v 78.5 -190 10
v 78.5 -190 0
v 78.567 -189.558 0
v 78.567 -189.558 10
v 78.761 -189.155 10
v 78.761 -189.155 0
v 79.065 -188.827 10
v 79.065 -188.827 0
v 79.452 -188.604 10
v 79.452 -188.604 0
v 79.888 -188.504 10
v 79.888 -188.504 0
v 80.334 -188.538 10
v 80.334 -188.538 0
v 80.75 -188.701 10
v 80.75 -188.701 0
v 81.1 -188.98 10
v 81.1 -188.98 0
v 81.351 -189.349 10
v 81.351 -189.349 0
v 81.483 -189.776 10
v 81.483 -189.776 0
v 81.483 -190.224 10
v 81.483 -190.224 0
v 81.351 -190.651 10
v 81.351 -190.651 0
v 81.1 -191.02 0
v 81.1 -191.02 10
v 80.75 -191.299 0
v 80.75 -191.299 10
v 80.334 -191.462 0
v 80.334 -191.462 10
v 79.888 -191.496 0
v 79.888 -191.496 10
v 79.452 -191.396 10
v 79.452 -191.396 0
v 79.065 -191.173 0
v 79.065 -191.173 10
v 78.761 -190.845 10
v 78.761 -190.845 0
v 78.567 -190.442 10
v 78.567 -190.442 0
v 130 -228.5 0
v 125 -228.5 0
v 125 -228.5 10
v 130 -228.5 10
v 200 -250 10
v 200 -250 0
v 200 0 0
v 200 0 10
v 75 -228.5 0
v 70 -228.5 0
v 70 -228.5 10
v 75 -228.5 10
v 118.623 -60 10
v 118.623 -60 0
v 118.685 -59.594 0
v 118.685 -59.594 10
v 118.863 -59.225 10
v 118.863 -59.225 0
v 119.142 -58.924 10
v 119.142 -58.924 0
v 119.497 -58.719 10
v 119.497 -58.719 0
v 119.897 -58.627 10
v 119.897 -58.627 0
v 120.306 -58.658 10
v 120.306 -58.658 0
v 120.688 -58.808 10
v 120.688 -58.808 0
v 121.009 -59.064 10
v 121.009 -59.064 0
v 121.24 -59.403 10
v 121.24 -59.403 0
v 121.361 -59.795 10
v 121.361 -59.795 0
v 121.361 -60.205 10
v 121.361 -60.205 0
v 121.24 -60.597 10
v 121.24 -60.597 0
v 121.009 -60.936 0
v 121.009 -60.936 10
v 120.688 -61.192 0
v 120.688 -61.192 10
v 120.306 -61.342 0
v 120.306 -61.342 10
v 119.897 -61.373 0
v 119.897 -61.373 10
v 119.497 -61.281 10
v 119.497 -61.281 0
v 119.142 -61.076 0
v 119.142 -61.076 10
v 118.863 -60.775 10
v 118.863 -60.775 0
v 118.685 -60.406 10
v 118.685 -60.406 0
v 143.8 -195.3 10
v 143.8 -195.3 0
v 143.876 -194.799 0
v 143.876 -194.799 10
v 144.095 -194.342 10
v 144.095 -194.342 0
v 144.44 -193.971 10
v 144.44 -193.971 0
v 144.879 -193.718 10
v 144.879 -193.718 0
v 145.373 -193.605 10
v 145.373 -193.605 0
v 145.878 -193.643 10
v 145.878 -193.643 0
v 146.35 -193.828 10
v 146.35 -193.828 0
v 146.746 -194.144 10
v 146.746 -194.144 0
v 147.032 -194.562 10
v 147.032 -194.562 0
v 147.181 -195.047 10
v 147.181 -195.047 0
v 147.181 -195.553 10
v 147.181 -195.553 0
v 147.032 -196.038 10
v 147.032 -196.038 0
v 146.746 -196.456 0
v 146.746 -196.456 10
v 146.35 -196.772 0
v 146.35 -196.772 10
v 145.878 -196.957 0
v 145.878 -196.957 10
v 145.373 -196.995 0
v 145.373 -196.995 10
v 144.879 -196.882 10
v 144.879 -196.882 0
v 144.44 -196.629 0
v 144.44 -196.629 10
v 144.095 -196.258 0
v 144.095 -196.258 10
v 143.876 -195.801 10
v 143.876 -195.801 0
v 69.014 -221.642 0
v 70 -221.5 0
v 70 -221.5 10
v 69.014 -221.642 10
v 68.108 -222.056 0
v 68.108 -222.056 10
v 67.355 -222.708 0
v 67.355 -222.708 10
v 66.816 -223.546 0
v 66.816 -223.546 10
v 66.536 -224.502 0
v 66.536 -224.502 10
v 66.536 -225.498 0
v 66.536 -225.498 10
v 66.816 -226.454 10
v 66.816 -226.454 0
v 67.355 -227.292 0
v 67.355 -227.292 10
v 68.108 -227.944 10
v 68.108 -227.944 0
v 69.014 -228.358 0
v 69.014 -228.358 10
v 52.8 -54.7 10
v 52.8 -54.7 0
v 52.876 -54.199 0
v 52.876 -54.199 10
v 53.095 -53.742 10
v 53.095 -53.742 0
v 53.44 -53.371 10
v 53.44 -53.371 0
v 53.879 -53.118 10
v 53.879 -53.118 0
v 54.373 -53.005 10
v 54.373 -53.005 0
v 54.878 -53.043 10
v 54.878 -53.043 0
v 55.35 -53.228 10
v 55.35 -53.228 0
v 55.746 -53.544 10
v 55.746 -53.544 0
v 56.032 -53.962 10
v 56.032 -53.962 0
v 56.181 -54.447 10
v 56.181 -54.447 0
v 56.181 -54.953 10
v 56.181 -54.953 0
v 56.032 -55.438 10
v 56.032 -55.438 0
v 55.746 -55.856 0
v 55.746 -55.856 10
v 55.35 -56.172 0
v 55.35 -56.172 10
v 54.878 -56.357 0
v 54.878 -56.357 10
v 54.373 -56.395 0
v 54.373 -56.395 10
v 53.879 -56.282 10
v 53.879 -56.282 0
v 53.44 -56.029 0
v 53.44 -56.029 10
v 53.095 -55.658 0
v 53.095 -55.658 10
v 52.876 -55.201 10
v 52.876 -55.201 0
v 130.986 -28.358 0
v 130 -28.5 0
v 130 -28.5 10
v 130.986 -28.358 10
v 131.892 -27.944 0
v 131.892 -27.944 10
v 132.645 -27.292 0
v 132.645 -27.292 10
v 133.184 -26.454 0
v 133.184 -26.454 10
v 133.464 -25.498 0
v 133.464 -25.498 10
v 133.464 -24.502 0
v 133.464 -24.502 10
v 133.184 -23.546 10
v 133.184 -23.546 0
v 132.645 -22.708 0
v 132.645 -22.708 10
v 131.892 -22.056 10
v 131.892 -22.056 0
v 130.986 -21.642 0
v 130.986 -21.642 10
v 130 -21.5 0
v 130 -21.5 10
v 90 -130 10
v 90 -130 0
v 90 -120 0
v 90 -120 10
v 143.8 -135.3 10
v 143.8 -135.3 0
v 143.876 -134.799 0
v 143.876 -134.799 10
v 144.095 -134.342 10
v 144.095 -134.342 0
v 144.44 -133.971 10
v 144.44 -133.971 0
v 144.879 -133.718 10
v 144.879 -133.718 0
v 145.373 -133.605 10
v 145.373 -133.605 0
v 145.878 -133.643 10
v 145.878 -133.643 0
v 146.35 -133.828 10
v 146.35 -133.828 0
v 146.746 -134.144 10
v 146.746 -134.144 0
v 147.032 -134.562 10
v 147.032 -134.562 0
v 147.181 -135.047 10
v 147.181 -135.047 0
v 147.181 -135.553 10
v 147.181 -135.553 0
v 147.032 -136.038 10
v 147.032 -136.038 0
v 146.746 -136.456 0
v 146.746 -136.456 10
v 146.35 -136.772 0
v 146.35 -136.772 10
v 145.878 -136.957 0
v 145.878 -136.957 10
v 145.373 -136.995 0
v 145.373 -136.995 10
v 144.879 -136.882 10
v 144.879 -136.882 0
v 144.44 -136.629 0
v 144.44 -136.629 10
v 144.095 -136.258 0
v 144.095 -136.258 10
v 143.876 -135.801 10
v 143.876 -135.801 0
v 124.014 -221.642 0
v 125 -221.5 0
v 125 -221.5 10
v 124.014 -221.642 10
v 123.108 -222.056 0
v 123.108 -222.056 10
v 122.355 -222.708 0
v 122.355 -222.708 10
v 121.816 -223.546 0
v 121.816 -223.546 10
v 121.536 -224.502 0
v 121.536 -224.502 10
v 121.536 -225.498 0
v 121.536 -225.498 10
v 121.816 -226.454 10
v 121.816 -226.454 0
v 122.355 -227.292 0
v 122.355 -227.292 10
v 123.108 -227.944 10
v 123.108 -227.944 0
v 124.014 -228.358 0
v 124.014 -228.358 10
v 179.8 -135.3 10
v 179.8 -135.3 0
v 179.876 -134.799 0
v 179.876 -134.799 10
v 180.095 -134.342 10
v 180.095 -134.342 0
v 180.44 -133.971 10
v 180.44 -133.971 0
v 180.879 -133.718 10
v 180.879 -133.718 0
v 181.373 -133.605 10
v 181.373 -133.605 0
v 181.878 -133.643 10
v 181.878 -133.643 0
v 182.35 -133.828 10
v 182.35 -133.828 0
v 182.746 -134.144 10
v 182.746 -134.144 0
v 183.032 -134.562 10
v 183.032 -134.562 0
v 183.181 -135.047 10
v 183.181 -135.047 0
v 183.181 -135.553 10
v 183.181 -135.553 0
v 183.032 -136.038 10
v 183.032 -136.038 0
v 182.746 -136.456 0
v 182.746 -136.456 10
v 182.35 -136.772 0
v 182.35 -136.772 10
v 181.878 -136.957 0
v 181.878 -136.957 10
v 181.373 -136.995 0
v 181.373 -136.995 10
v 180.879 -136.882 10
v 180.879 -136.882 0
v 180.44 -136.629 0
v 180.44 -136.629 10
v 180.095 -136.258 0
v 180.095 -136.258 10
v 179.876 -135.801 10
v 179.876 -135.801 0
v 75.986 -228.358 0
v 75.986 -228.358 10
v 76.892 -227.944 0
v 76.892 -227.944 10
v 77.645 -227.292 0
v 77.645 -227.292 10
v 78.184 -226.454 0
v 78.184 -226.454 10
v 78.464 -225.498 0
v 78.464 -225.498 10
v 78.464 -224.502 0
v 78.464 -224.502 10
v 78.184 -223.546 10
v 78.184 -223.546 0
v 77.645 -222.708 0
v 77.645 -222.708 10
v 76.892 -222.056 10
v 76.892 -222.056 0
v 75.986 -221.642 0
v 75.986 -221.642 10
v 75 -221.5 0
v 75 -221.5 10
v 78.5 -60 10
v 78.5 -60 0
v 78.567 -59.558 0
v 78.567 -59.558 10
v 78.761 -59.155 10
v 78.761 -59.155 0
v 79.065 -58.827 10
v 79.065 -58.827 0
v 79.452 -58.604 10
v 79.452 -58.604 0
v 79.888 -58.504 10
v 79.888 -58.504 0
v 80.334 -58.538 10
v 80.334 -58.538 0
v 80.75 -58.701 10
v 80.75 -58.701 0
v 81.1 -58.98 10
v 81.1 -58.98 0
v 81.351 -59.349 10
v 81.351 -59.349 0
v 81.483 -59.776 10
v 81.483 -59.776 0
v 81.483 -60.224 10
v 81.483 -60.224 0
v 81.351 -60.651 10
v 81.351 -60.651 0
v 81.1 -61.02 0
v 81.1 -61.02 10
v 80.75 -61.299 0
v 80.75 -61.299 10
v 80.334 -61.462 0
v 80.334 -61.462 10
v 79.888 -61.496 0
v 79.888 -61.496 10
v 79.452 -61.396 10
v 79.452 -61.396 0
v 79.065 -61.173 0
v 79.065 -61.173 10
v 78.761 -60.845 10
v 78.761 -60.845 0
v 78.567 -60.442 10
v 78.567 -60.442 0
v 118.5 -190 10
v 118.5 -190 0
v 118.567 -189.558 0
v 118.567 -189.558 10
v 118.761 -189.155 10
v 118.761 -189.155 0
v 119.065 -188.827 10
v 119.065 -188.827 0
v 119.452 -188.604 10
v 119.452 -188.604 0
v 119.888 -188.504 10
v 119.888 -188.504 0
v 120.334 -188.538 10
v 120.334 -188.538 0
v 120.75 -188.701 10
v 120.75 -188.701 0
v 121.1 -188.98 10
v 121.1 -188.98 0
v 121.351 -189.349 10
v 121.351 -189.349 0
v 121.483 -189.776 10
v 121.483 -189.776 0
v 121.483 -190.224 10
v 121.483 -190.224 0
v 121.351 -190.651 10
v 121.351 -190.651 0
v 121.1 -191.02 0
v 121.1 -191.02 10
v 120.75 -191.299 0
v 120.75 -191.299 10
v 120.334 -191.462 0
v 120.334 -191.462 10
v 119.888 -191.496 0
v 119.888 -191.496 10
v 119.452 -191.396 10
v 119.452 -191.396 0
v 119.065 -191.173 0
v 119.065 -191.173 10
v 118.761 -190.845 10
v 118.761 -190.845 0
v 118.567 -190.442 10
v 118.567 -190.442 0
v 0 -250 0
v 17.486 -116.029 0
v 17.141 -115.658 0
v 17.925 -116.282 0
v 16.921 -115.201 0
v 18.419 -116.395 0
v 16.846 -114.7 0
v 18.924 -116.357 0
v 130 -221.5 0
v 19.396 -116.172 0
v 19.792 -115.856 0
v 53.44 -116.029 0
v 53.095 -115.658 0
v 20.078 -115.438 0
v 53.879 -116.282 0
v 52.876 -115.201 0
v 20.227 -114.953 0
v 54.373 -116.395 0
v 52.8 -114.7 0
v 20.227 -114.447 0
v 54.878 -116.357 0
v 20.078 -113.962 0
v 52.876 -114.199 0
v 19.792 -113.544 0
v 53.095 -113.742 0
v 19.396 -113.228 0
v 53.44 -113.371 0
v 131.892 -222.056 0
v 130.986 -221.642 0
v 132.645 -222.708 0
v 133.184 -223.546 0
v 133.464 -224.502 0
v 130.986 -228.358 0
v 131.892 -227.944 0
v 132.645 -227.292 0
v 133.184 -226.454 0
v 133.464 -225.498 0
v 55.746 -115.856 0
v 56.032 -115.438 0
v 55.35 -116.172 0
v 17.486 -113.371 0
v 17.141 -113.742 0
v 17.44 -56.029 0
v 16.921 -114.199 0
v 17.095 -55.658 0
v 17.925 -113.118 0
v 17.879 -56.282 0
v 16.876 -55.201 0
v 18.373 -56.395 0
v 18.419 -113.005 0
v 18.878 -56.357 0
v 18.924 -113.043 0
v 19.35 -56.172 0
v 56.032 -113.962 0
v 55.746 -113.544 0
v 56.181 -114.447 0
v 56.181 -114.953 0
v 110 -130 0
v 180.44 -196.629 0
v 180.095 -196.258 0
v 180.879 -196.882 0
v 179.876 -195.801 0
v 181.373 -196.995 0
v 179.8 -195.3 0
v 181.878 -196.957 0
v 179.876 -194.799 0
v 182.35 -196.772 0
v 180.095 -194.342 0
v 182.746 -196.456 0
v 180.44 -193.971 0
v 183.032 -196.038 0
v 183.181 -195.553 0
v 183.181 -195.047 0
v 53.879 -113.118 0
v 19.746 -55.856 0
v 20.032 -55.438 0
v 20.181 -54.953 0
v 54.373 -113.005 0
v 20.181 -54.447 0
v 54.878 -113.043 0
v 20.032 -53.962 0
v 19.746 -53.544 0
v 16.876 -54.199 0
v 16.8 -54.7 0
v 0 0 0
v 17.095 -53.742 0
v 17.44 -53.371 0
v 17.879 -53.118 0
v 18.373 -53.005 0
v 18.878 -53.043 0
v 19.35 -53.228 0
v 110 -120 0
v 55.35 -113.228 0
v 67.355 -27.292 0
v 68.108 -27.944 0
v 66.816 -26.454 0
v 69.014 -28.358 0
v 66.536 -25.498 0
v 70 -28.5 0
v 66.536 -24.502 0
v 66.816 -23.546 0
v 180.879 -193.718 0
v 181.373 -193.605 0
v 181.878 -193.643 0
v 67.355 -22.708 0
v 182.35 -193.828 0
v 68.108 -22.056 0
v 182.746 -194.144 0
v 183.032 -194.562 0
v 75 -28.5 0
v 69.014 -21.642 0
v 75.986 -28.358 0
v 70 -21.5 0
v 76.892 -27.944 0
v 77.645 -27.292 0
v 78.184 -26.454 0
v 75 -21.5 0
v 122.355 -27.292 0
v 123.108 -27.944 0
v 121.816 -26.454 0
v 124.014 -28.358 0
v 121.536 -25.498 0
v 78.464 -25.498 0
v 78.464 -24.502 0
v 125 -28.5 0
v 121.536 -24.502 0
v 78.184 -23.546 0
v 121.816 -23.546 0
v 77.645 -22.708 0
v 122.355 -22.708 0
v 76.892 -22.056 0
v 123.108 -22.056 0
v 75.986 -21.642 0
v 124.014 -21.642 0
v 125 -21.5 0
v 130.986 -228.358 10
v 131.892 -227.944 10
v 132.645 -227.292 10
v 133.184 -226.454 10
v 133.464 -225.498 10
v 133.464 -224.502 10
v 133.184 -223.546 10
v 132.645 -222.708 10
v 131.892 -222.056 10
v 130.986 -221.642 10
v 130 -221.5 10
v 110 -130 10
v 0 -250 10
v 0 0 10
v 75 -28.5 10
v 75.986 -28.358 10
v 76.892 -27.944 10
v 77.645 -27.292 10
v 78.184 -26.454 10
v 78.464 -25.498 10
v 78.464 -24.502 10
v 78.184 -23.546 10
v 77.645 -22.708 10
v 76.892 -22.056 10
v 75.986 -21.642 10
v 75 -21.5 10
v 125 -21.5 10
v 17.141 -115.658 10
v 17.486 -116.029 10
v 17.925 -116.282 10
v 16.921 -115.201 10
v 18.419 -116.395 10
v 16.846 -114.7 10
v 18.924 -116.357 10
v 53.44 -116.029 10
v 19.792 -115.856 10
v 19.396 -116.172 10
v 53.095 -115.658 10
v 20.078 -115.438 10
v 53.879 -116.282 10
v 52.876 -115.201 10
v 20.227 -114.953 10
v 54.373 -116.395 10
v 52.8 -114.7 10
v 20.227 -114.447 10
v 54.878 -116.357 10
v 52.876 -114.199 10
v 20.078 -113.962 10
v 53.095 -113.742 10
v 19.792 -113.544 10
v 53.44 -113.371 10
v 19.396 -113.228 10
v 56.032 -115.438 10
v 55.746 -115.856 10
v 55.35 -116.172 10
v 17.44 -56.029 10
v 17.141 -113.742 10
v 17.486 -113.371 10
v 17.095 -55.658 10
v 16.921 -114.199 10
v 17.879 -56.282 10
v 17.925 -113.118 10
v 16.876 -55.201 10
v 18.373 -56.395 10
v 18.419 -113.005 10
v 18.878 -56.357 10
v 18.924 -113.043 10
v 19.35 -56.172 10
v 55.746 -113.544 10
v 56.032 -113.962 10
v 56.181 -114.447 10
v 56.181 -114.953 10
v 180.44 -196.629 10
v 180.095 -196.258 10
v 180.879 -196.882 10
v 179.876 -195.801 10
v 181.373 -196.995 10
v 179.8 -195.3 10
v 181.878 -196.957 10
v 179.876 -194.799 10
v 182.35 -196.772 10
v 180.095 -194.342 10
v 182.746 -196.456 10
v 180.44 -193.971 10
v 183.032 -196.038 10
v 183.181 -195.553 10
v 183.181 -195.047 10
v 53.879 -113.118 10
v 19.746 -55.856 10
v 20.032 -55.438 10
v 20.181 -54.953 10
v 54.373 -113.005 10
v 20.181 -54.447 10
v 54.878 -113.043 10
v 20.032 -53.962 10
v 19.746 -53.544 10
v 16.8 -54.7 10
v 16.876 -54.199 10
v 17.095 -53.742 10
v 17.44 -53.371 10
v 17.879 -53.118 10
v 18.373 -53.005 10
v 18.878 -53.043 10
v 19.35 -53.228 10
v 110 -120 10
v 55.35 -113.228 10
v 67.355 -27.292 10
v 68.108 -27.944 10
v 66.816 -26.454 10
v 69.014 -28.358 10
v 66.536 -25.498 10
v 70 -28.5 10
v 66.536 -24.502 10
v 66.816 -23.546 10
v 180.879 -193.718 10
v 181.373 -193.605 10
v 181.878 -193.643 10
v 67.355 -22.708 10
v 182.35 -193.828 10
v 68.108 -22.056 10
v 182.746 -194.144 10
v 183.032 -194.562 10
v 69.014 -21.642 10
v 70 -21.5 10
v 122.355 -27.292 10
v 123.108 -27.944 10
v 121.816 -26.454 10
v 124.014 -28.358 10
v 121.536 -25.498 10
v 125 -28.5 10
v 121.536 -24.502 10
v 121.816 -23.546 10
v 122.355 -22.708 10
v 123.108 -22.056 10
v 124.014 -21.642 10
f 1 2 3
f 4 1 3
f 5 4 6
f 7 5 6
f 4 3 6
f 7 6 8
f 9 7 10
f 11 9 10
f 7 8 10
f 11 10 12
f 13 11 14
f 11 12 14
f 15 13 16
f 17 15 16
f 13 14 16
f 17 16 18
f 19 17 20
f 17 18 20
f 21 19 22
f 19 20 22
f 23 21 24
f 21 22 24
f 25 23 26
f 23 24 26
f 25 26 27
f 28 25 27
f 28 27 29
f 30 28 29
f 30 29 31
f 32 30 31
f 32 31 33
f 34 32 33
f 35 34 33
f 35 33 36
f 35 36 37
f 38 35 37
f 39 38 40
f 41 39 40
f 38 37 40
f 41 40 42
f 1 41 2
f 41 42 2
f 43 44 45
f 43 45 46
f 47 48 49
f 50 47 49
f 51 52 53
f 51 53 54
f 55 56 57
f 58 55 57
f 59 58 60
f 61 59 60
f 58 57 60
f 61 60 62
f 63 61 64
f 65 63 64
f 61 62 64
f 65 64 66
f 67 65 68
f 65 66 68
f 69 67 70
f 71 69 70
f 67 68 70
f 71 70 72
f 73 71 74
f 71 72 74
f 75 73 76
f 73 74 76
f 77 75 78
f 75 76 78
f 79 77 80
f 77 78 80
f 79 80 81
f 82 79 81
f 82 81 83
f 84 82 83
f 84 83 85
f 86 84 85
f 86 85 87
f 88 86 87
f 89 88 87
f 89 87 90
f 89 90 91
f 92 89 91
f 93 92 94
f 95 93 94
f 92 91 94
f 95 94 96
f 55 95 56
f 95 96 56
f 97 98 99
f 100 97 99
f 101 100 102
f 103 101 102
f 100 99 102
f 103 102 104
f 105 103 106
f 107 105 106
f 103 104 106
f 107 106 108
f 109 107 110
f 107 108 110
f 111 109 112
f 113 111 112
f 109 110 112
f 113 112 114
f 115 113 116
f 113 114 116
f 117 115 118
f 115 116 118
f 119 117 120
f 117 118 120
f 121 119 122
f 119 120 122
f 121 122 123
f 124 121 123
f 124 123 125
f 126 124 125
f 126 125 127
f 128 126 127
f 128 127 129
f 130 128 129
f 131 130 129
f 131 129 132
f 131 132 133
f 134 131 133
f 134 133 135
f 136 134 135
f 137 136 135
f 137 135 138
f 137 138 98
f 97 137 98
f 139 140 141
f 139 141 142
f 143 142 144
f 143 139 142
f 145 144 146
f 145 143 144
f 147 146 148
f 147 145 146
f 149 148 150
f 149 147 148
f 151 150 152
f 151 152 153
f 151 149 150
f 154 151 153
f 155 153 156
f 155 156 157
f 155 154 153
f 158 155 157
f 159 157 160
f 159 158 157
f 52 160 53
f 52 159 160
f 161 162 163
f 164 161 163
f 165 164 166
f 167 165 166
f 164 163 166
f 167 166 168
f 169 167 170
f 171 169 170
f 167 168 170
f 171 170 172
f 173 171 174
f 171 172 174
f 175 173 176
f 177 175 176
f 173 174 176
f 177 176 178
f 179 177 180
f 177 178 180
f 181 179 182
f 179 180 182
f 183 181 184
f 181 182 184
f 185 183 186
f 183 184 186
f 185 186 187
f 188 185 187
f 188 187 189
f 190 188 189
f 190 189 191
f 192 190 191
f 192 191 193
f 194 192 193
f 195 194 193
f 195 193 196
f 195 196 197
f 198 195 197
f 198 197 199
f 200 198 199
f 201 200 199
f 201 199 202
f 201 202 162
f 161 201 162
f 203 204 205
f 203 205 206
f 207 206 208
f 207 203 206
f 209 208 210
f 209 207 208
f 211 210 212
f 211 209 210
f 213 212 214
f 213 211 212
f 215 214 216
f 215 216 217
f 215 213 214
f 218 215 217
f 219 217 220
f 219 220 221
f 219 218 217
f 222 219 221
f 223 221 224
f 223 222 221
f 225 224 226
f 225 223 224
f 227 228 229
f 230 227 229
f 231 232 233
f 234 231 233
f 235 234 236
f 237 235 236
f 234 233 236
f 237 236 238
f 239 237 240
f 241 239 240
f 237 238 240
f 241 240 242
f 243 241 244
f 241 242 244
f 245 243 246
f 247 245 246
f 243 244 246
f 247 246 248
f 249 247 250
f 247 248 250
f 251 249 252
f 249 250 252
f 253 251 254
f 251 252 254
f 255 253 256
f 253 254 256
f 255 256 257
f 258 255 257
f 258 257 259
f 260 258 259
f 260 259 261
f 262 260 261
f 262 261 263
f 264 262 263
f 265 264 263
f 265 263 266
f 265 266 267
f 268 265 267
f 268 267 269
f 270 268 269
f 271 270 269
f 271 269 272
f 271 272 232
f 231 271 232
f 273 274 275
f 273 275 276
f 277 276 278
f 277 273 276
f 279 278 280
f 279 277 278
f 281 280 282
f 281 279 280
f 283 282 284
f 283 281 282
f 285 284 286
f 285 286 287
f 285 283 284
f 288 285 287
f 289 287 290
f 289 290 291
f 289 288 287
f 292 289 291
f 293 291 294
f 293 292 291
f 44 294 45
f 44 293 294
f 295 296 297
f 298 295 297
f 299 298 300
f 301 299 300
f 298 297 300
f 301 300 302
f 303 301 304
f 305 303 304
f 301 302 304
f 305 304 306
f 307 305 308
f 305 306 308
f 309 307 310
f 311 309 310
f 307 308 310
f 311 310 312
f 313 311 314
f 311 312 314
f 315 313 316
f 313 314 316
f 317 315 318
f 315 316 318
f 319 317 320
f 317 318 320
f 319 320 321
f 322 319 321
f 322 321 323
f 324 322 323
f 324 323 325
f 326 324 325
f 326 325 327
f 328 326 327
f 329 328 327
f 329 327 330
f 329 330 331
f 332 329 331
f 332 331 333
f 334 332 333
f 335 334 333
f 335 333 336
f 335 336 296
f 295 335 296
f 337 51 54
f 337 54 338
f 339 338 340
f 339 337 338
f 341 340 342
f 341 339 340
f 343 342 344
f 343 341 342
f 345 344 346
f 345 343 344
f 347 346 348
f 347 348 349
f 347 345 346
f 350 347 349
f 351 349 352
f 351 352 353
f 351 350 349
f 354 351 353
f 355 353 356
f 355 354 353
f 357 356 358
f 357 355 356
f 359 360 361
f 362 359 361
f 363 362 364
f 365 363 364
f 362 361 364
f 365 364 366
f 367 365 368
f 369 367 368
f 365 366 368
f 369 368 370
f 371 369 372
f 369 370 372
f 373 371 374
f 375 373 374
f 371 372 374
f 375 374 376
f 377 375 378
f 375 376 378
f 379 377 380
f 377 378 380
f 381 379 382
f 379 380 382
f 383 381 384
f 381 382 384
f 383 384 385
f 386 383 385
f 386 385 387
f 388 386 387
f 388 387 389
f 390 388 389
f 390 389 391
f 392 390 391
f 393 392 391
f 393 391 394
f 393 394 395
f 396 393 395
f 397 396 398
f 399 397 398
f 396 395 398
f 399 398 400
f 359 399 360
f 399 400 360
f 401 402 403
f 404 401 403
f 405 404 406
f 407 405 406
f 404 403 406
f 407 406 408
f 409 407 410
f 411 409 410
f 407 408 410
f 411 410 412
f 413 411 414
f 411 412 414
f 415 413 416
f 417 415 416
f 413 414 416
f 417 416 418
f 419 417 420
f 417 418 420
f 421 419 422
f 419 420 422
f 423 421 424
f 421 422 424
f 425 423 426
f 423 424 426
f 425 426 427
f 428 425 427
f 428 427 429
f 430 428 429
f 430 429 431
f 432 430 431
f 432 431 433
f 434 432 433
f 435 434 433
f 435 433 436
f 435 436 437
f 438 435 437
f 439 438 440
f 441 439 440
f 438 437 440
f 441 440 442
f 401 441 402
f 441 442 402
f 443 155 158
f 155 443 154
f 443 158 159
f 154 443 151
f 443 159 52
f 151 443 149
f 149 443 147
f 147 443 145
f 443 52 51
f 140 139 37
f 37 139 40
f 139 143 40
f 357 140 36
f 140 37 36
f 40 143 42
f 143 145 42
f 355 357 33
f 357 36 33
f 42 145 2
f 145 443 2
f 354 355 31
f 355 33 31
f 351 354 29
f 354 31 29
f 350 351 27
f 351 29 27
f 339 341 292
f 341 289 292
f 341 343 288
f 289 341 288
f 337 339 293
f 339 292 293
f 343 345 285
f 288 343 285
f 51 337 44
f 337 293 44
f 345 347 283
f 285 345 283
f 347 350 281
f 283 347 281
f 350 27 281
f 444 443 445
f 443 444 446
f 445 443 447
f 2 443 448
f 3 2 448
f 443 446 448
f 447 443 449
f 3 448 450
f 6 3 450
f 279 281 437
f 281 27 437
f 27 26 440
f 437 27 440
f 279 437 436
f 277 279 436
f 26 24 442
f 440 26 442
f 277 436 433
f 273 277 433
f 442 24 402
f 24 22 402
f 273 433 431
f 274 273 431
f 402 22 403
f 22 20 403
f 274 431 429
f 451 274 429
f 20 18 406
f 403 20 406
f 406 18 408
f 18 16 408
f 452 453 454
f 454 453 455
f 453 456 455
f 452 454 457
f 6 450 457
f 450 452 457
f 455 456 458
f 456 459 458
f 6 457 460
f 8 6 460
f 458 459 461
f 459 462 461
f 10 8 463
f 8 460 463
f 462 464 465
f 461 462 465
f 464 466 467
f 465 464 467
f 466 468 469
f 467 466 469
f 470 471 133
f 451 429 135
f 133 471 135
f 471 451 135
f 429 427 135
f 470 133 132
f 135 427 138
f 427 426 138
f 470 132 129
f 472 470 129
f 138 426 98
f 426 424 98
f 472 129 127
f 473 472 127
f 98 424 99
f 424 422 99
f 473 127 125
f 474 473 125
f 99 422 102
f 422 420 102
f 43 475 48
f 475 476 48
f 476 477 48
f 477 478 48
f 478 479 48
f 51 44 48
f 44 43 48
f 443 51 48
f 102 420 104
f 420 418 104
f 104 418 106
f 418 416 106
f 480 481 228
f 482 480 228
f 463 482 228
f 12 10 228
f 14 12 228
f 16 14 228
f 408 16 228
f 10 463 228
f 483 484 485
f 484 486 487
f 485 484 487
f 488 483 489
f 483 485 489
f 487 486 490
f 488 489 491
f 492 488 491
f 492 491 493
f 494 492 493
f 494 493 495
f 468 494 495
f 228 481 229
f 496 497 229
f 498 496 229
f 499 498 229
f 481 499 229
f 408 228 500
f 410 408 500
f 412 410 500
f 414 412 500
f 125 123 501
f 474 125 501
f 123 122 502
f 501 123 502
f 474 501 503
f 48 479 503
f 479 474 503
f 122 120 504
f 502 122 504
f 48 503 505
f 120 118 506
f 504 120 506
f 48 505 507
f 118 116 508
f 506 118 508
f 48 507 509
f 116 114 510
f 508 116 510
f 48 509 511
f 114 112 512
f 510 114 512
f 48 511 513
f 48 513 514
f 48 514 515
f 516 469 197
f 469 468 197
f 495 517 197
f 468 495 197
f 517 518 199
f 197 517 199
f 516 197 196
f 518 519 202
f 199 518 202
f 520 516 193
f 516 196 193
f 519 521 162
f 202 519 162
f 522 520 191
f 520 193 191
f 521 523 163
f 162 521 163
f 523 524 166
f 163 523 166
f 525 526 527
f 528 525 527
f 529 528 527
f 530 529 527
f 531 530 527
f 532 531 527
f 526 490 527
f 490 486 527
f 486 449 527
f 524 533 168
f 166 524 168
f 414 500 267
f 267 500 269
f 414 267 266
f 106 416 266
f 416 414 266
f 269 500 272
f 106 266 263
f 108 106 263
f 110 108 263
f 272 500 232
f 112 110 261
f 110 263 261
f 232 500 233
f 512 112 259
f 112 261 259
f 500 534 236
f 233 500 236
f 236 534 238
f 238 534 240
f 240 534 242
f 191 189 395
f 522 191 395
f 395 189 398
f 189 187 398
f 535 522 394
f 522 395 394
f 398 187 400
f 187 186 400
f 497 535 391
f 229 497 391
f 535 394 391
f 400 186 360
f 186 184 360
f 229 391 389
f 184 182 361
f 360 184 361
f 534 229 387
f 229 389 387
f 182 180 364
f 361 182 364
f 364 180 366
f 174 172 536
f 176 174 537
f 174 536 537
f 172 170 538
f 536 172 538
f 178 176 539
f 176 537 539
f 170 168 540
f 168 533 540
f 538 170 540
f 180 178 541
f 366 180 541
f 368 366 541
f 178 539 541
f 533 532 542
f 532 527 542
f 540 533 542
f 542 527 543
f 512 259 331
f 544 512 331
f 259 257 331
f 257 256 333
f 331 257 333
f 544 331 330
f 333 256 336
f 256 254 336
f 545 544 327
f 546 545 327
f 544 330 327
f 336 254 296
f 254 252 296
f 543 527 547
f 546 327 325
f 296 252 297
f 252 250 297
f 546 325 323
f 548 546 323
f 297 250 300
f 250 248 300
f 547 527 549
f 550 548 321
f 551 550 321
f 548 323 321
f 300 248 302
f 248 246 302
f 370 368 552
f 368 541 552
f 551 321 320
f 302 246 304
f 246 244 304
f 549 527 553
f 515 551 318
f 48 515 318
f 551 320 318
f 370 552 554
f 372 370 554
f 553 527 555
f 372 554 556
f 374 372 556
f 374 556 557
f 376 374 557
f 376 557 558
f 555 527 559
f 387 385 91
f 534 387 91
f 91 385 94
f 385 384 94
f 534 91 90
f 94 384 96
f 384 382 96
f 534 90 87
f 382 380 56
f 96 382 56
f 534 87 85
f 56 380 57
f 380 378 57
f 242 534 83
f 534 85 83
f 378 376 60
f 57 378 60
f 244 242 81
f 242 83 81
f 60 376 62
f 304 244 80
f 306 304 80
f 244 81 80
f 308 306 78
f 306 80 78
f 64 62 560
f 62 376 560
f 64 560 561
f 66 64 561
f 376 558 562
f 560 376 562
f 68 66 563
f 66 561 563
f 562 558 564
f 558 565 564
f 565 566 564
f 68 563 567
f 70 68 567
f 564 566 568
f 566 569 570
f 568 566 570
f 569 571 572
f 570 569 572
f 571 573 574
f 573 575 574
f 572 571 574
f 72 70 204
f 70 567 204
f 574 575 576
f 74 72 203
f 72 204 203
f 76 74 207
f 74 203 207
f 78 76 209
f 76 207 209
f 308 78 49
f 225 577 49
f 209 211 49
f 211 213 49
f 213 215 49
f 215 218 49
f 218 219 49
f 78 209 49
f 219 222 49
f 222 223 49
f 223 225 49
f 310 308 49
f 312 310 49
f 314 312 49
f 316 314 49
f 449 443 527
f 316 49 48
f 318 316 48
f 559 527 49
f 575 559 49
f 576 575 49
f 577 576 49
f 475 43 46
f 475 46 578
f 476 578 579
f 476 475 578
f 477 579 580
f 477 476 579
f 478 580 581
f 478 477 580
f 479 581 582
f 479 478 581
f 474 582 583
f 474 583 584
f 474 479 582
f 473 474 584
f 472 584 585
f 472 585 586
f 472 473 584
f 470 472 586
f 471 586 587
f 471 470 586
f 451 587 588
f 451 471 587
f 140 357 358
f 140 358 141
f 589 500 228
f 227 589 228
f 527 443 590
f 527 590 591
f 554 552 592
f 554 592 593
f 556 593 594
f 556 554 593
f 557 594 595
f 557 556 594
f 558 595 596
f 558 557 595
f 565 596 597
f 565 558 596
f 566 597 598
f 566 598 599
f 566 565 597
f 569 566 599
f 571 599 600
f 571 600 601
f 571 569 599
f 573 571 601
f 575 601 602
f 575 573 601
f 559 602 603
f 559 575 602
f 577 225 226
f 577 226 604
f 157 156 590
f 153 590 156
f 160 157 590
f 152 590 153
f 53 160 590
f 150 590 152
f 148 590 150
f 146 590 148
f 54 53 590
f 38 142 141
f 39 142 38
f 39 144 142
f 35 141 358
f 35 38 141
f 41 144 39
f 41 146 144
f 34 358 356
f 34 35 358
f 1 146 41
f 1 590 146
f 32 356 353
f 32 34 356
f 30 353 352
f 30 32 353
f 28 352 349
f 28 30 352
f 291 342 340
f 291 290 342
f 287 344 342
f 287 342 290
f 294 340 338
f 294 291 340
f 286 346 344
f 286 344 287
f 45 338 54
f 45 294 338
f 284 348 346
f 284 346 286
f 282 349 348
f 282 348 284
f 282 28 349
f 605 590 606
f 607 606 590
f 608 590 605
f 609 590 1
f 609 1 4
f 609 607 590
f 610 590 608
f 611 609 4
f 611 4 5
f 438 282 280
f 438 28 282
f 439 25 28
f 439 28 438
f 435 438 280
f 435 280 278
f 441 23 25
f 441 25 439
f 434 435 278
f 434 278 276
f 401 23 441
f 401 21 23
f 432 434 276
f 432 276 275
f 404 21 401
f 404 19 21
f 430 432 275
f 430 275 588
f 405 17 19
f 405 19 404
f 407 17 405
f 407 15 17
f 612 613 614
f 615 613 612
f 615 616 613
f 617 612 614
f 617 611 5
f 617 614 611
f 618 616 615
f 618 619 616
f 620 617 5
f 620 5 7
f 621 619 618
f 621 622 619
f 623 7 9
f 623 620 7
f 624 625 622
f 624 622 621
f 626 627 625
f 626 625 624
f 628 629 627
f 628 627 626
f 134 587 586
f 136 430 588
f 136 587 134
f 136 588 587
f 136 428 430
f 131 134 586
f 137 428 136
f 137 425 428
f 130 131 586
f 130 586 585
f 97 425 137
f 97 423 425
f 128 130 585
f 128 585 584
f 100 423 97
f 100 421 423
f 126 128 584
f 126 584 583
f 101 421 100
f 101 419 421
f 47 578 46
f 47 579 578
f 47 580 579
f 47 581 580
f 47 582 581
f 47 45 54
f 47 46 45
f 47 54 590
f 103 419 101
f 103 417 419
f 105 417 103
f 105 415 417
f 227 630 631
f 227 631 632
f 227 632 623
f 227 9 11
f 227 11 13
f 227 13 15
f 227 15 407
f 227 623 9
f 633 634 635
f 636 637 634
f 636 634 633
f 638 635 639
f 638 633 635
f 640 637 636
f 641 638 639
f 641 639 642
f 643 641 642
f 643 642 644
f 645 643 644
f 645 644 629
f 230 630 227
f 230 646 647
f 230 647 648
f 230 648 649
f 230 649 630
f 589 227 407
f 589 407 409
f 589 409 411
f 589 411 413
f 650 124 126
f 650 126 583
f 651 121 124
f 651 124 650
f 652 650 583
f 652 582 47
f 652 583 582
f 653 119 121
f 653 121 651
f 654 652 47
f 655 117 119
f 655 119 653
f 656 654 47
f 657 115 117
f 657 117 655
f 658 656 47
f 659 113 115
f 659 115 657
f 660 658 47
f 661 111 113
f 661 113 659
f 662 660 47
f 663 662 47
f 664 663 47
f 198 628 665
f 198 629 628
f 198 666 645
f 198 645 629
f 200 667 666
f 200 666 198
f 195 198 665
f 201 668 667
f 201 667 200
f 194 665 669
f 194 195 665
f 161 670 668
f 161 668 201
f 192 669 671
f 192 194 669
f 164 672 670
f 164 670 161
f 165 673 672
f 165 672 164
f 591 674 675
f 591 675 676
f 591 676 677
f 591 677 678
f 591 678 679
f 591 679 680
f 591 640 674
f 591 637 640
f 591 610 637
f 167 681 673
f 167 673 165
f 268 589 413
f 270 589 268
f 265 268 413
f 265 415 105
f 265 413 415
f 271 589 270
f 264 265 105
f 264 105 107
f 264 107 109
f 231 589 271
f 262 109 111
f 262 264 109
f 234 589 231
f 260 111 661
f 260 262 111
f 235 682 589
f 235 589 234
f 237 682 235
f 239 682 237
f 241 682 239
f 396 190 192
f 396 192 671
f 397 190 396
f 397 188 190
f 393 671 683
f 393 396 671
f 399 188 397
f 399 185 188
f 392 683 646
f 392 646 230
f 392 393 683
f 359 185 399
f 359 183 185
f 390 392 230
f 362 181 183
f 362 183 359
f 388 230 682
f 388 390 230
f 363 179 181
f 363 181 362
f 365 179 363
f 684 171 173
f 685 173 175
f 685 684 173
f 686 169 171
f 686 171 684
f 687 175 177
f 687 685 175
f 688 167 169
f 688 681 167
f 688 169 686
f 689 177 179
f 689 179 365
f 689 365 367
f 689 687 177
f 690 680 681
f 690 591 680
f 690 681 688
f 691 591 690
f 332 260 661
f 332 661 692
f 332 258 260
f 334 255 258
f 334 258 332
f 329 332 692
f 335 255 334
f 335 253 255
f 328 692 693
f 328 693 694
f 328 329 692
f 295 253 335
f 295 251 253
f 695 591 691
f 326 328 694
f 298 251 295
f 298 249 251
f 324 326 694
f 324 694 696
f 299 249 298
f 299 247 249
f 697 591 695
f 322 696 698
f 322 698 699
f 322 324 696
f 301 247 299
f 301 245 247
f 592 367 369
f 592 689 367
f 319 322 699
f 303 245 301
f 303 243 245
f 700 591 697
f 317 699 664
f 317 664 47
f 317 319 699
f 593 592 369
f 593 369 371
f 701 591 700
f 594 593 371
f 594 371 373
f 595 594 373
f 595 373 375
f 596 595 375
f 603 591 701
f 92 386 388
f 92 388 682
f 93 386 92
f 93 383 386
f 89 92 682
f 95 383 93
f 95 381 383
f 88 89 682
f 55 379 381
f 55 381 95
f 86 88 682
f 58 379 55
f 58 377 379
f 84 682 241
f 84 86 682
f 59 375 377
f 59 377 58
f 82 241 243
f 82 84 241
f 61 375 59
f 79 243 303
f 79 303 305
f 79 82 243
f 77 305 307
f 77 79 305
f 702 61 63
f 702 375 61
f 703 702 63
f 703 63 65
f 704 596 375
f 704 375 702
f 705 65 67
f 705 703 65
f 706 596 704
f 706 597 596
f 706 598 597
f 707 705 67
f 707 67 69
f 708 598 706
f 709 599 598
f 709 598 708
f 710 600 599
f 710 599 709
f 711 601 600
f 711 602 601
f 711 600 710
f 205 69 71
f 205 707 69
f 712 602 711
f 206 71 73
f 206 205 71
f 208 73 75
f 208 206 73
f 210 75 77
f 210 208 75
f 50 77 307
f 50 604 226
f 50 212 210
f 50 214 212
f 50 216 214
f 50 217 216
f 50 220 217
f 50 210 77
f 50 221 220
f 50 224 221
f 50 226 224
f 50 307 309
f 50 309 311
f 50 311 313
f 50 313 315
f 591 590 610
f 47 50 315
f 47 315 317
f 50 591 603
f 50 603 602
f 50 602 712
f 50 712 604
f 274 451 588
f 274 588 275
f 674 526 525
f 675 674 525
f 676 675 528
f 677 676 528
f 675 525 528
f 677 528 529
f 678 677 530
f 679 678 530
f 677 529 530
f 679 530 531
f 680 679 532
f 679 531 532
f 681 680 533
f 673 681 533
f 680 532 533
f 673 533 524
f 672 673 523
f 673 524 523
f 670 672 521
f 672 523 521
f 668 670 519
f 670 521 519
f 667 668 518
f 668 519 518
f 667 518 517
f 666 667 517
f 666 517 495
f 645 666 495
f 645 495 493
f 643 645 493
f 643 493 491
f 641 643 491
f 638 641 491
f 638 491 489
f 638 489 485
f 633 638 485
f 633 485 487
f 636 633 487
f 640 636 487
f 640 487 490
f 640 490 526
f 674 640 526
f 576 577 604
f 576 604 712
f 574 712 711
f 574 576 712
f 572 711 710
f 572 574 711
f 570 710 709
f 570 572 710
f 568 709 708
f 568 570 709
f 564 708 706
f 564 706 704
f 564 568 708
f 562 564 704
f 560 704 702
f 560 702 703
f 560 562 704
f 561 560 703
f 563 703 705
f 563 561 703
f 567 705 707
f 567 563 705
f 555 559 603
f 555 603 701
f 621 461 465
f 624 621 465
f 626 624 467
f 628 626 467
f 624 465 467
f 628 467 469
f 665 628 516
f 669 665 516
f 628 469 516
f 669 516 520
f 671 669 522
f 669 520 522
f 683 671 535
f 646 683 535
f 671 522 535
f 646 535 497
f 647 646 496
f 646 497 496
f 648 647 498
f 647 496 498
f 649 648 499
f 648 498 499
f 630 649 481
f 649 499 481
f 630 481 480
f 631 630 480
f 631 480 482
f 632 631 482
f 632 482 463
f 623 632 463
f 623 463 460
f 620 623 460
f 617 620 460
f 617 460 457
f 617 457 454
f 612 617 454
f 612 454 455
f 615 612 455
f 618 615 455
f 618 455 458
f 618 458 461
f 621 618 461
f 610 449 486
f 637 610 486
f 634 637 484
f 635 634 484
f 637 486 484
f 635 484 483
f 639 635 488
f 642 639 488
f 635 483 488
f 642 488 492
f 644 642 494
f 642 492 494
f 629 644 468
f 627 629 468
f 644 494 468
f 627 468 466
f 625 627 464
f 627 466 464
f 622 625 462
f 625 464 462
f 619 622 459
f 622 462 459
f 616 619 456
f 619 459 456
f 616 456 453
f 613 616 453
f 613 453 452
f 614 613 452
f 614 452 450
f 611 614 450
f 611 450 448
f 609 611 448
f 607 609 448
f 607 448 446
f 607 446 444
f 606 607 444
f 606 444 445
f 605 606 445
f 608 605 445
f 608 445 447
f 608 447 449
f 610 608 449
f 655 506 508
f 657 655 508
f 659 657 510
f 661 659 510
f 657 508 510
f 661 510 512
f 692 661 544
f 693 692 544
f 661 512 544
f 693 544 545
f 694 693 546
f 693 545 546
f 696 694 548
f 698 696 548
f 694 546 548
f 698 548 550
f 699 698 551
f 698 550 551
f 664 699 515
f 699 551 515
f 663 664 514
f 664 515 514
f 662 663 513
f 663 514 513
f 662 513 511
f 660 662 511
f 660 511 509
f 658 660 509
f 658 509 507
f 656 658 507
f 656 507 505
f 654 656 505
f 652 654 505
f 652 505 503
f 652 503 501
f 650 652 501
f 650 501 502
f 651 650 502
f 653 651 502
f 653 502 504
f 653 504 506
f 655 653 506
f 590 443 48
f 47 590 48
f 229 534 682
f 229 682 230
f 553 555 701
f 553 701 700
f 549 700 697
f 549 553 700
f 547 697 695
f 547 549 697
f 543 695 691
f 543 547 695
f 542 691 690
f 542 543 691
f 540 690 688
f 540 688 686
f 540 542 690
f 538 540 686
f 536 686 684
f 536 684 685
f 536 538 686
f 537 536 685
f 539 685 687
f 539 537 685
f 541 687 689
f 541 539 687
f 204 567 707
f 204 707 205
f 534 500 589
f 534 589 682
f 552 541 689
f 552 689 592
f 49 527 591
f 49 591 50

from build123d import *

# Parameters (mm, degrees)
ESQUISSE2_W             = 200
ESQUISSE2_H             = 250
BOSS_EXTRU_1_DEPTH      = 10
ESQUISSE7_W             = 20
ESQUISSE7_H             = 10
ENL_V_MAT_EXTRU_2_DEPTH = 10
ENL_V_MAT_EXTRU_3_DEPTH = 10
ESQUISSE11_R            = 1.5
ESQUISSE11_R_2          = 1.37656202
ENL_V_MAT_EXTRU_4_DEPTH = 10
D_GAGEMENT_M31_D        = 3.4


with BuildPart() as part:
    # Esquisse2 → Boss.-Extru.1 (new body)
    with BuildSketch(Plane.XY):
        with Locations((100, -125)):
            Rectangle(ESQUISSE2_W, ESQUISSE2_H)
    extrude(amount=BOSS_EXTRU_1_DEPTH)

    # Esquisse7 → Enlèv. mat.-Extru.2 (cut)
    with BuildSketch(Plane(origin=(0, 0, 0), x_dir=(-1, 0, 0), z_dir=(0, 0, -1))):
        with Locations((-100, -125)):
            Rectangle(ESQUISSE7_W, ESQUISSE7_H)
    extrude(amount=-ENL_V_MAT_EXTRU_2_DEPTH, mode=Mode.SUBTRACT)

    # Esquisse10 → Enlèv. mat.-Extru.3 (cut)
    with BuildSketch(Plane(origin=(0, 0, 0), x_dir=(-1, 0, 0), z_dir=(0, 0, -1))):
        with BuildLine():
            Line((-70, -28.5), (-75, -28.5))
            ThreePointArc((-75, -28.5), (-78.5, -25), (-75, -21.5))
            Line((-75, -21.5), (-70, -21.5))
            ThreePointArc((-70, -21.5), (-66.5, -25), (-70, -28.5))
        make_face()
        with BuildLine():
            Line((-70, -228.5), (-75, -228.5))
            ThreePointArc((-75, -228.5), (-78.5, -225), (-75, -221.5))
            Line((-75, -221.5), (-70, -221.5))
            ThreePointArc((-70, -221.5), (-66.5, -225), (-70, -228.5))
        make_face()
        with BuildLine():
            Line((-130, -221.5), (-125, -221.5))
            ThreePointArc((-125, -221.5), (-121.5, -225), (-125, -228.5))
            Line((-125, -228.5), (-130, -228.5))
            ThreePointArc((-130, -228.5), (-133.5, -225), (-130, -221.5))
        make_face()
        with BuildLine():
            Line((-130, -21.5), (-125, -21.5))
            ThreePointArc((-125, -21.5), (-121.5, -25), (-125, -28.5))
            Line((-125, -28.5), (-130, -28.5))
            ThreePointArc((-130, -28.5), (-133.5, -25), (-130, -21.5))
        make_face()
    extrude(amount=-ENL_V_MAT_EXTRU_3_DEPTH, mode=Mode.SUBTRACT)

    # Esquisse11 → Enlèv. mat.-Extru.4 (cut)
    with BuildSketch(Plane(origin=(0, 0, 0), x_dir=(-1, 0, 0), z_dir=(0, 0, -1))):
        with Locations((-80, -190)):
            Circle(ESQUISSE11_R)
        with Locations((-120, -190)):
            Circle(ESQUISSE11_R)
        with Locations((-80, -60)):
            Circle(ESQUISSE11_R)
        with Locations((-120, -60)):
            Circle(ESQUISSE11_R_2)
    extrude(amount=-ENL_V_MAT_EXTRU_4_DEPTH, mode=Mode.SUBTRACT)

    # Dégagement M31 (through all)
    with Locations(Plane.XY.offset(10)):
        with Locations((18.5, -54.7), (54.5, -54.7), (18.545923706, -114.7), (54.5, -114.7), (145.5, -135.3), (181.5, -135.3), (145.5, -195.3), (181.5, -195.3)):
            Hole(D_GAGEMENT_M31_D / 2)


solid = part.part
